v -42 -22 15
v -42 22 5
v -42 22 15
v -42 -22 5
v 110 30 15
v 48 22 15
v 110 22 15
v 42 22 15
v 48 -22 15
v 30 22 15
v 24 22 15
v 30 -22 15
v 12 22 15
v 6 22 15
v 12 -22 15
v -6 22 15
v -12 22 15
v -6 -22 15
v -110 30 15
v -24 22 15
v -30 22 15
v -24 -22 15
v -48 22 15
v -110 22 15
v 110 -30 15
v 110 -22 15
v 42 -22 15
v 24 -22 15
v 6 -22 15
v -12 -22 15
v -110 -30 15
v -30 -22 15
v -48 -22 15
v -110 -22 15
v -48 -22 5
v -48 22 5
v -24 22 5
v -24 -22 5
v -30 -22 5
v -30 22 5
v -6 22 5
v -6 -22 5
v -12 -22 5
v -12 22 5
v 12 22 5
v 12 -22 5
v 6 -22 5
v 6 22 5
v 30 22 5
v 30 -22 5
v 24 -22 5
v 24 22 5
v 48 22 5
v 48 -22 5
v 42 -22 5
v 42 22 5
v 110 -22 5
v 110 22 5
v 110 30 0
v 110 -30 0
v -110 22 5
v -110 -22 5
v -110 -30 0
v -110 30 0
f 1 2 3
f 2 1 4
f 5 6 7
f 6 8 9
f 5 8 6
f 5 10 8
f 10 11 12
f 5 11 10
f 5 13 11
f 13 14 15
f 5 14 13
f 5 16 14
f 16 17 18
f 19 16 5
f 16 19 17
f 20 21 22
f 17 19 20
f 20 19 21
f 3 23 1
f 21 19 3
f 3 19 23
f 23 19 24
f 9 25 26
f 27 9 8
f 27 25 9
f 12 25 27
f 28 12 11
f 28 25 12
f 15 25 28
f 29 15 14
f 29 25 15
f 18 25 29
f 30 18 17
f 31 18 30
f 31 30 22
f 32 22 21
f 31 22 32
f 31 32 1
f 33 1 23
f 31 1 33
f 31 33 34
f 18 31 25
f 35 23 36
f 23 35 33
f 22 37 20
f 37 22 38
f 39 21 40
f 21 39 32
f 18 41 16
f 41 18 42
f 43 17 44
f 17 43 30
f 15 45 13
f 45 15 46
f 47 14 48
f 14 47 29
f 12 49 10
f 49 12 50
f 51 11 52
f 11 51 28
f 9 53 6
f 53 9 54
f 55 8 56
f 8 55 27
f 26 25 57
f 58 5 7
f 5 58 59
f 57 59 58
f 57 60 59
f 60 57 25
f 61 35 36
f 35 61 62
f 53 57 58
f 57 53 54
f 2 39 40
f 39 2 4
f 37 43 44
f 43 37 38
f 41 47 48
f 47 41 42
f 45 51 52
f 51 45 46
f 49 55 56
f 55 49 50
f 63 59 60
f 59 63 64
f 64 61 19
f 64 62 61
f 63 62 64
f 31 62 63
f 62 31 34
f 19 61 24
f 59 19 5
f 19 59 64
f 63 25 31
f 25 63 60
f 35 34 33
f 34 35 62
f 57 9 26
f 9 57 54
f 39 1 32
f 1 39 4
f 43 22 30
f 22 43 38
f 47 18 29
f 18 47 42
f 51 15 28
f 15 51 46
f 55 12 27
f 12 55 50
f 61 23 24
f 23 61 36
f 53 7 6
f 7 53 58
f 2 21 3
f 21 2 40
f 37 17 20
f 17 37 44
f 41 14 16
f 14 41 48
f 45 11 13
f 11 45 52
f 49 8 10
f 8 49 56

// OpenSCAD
$fn = 32;

// ----------------------------------------------------------------------
// Rib frame 220 x 60 x 15
// 6 ribs at 18 mm pitch
// ----------------------------------------------------------------------

// --- parameters (mm) ---
frame = [220, 60, 5];  // base plate size (x, y, z)
rail_w = 8;            // side rail width
ribs = 6;              // number of ribs
rib_t = 6;             // rib thickness
rib_h = 10;            // rib height above the base plate
pitch = 18;            // pitch between rib centres

// --- derived feature positions (mm) ---
span = (ribs - 1) * pitch;          // = 90   distance between the outer ribs
origin_x = -span / 2;               // = -45   X of the first rib
rib_len = frame[1] - 2 * rail_w + 2;  // = 46   rib length, 1 mm into each rail
feature_centers = [
  [origin_x + 0 * pitch, 0],
  [origin_x + 1 * pitch, 0],
  [origin_x + 2 * pitch, 0],
  [origin_x + 3 * pitch, 0],
  [origin_x + 4 * pitch, 0],
  [origin_x + 5 * pitch, 0]
];   // rib centre line, drives the rib loop

// base plate, two side rails, then the ribs read straight off feature_centers
union() {
  translate([-frame[0] / 2, -frame[1] / 2, 0]) cube(frame);
  translate([-frame[0] / 2, -frame[1] / 2, 0]) cube([frame[0], rail_w, frame[2] + rib_h]);
  translate([-frame[0] / 2, frame[1] / 2 - rail_w, 0]) cube([frame[0], rail_w, frame[2] + rib_h]);
  for (centre = feature_centers)
    translate([centre[0] - rib_t / 2, centre[1] - rib_len / 2, frame[2] - 1])
      cube([rib_t, rib_len, rib_h + 1]);
}
